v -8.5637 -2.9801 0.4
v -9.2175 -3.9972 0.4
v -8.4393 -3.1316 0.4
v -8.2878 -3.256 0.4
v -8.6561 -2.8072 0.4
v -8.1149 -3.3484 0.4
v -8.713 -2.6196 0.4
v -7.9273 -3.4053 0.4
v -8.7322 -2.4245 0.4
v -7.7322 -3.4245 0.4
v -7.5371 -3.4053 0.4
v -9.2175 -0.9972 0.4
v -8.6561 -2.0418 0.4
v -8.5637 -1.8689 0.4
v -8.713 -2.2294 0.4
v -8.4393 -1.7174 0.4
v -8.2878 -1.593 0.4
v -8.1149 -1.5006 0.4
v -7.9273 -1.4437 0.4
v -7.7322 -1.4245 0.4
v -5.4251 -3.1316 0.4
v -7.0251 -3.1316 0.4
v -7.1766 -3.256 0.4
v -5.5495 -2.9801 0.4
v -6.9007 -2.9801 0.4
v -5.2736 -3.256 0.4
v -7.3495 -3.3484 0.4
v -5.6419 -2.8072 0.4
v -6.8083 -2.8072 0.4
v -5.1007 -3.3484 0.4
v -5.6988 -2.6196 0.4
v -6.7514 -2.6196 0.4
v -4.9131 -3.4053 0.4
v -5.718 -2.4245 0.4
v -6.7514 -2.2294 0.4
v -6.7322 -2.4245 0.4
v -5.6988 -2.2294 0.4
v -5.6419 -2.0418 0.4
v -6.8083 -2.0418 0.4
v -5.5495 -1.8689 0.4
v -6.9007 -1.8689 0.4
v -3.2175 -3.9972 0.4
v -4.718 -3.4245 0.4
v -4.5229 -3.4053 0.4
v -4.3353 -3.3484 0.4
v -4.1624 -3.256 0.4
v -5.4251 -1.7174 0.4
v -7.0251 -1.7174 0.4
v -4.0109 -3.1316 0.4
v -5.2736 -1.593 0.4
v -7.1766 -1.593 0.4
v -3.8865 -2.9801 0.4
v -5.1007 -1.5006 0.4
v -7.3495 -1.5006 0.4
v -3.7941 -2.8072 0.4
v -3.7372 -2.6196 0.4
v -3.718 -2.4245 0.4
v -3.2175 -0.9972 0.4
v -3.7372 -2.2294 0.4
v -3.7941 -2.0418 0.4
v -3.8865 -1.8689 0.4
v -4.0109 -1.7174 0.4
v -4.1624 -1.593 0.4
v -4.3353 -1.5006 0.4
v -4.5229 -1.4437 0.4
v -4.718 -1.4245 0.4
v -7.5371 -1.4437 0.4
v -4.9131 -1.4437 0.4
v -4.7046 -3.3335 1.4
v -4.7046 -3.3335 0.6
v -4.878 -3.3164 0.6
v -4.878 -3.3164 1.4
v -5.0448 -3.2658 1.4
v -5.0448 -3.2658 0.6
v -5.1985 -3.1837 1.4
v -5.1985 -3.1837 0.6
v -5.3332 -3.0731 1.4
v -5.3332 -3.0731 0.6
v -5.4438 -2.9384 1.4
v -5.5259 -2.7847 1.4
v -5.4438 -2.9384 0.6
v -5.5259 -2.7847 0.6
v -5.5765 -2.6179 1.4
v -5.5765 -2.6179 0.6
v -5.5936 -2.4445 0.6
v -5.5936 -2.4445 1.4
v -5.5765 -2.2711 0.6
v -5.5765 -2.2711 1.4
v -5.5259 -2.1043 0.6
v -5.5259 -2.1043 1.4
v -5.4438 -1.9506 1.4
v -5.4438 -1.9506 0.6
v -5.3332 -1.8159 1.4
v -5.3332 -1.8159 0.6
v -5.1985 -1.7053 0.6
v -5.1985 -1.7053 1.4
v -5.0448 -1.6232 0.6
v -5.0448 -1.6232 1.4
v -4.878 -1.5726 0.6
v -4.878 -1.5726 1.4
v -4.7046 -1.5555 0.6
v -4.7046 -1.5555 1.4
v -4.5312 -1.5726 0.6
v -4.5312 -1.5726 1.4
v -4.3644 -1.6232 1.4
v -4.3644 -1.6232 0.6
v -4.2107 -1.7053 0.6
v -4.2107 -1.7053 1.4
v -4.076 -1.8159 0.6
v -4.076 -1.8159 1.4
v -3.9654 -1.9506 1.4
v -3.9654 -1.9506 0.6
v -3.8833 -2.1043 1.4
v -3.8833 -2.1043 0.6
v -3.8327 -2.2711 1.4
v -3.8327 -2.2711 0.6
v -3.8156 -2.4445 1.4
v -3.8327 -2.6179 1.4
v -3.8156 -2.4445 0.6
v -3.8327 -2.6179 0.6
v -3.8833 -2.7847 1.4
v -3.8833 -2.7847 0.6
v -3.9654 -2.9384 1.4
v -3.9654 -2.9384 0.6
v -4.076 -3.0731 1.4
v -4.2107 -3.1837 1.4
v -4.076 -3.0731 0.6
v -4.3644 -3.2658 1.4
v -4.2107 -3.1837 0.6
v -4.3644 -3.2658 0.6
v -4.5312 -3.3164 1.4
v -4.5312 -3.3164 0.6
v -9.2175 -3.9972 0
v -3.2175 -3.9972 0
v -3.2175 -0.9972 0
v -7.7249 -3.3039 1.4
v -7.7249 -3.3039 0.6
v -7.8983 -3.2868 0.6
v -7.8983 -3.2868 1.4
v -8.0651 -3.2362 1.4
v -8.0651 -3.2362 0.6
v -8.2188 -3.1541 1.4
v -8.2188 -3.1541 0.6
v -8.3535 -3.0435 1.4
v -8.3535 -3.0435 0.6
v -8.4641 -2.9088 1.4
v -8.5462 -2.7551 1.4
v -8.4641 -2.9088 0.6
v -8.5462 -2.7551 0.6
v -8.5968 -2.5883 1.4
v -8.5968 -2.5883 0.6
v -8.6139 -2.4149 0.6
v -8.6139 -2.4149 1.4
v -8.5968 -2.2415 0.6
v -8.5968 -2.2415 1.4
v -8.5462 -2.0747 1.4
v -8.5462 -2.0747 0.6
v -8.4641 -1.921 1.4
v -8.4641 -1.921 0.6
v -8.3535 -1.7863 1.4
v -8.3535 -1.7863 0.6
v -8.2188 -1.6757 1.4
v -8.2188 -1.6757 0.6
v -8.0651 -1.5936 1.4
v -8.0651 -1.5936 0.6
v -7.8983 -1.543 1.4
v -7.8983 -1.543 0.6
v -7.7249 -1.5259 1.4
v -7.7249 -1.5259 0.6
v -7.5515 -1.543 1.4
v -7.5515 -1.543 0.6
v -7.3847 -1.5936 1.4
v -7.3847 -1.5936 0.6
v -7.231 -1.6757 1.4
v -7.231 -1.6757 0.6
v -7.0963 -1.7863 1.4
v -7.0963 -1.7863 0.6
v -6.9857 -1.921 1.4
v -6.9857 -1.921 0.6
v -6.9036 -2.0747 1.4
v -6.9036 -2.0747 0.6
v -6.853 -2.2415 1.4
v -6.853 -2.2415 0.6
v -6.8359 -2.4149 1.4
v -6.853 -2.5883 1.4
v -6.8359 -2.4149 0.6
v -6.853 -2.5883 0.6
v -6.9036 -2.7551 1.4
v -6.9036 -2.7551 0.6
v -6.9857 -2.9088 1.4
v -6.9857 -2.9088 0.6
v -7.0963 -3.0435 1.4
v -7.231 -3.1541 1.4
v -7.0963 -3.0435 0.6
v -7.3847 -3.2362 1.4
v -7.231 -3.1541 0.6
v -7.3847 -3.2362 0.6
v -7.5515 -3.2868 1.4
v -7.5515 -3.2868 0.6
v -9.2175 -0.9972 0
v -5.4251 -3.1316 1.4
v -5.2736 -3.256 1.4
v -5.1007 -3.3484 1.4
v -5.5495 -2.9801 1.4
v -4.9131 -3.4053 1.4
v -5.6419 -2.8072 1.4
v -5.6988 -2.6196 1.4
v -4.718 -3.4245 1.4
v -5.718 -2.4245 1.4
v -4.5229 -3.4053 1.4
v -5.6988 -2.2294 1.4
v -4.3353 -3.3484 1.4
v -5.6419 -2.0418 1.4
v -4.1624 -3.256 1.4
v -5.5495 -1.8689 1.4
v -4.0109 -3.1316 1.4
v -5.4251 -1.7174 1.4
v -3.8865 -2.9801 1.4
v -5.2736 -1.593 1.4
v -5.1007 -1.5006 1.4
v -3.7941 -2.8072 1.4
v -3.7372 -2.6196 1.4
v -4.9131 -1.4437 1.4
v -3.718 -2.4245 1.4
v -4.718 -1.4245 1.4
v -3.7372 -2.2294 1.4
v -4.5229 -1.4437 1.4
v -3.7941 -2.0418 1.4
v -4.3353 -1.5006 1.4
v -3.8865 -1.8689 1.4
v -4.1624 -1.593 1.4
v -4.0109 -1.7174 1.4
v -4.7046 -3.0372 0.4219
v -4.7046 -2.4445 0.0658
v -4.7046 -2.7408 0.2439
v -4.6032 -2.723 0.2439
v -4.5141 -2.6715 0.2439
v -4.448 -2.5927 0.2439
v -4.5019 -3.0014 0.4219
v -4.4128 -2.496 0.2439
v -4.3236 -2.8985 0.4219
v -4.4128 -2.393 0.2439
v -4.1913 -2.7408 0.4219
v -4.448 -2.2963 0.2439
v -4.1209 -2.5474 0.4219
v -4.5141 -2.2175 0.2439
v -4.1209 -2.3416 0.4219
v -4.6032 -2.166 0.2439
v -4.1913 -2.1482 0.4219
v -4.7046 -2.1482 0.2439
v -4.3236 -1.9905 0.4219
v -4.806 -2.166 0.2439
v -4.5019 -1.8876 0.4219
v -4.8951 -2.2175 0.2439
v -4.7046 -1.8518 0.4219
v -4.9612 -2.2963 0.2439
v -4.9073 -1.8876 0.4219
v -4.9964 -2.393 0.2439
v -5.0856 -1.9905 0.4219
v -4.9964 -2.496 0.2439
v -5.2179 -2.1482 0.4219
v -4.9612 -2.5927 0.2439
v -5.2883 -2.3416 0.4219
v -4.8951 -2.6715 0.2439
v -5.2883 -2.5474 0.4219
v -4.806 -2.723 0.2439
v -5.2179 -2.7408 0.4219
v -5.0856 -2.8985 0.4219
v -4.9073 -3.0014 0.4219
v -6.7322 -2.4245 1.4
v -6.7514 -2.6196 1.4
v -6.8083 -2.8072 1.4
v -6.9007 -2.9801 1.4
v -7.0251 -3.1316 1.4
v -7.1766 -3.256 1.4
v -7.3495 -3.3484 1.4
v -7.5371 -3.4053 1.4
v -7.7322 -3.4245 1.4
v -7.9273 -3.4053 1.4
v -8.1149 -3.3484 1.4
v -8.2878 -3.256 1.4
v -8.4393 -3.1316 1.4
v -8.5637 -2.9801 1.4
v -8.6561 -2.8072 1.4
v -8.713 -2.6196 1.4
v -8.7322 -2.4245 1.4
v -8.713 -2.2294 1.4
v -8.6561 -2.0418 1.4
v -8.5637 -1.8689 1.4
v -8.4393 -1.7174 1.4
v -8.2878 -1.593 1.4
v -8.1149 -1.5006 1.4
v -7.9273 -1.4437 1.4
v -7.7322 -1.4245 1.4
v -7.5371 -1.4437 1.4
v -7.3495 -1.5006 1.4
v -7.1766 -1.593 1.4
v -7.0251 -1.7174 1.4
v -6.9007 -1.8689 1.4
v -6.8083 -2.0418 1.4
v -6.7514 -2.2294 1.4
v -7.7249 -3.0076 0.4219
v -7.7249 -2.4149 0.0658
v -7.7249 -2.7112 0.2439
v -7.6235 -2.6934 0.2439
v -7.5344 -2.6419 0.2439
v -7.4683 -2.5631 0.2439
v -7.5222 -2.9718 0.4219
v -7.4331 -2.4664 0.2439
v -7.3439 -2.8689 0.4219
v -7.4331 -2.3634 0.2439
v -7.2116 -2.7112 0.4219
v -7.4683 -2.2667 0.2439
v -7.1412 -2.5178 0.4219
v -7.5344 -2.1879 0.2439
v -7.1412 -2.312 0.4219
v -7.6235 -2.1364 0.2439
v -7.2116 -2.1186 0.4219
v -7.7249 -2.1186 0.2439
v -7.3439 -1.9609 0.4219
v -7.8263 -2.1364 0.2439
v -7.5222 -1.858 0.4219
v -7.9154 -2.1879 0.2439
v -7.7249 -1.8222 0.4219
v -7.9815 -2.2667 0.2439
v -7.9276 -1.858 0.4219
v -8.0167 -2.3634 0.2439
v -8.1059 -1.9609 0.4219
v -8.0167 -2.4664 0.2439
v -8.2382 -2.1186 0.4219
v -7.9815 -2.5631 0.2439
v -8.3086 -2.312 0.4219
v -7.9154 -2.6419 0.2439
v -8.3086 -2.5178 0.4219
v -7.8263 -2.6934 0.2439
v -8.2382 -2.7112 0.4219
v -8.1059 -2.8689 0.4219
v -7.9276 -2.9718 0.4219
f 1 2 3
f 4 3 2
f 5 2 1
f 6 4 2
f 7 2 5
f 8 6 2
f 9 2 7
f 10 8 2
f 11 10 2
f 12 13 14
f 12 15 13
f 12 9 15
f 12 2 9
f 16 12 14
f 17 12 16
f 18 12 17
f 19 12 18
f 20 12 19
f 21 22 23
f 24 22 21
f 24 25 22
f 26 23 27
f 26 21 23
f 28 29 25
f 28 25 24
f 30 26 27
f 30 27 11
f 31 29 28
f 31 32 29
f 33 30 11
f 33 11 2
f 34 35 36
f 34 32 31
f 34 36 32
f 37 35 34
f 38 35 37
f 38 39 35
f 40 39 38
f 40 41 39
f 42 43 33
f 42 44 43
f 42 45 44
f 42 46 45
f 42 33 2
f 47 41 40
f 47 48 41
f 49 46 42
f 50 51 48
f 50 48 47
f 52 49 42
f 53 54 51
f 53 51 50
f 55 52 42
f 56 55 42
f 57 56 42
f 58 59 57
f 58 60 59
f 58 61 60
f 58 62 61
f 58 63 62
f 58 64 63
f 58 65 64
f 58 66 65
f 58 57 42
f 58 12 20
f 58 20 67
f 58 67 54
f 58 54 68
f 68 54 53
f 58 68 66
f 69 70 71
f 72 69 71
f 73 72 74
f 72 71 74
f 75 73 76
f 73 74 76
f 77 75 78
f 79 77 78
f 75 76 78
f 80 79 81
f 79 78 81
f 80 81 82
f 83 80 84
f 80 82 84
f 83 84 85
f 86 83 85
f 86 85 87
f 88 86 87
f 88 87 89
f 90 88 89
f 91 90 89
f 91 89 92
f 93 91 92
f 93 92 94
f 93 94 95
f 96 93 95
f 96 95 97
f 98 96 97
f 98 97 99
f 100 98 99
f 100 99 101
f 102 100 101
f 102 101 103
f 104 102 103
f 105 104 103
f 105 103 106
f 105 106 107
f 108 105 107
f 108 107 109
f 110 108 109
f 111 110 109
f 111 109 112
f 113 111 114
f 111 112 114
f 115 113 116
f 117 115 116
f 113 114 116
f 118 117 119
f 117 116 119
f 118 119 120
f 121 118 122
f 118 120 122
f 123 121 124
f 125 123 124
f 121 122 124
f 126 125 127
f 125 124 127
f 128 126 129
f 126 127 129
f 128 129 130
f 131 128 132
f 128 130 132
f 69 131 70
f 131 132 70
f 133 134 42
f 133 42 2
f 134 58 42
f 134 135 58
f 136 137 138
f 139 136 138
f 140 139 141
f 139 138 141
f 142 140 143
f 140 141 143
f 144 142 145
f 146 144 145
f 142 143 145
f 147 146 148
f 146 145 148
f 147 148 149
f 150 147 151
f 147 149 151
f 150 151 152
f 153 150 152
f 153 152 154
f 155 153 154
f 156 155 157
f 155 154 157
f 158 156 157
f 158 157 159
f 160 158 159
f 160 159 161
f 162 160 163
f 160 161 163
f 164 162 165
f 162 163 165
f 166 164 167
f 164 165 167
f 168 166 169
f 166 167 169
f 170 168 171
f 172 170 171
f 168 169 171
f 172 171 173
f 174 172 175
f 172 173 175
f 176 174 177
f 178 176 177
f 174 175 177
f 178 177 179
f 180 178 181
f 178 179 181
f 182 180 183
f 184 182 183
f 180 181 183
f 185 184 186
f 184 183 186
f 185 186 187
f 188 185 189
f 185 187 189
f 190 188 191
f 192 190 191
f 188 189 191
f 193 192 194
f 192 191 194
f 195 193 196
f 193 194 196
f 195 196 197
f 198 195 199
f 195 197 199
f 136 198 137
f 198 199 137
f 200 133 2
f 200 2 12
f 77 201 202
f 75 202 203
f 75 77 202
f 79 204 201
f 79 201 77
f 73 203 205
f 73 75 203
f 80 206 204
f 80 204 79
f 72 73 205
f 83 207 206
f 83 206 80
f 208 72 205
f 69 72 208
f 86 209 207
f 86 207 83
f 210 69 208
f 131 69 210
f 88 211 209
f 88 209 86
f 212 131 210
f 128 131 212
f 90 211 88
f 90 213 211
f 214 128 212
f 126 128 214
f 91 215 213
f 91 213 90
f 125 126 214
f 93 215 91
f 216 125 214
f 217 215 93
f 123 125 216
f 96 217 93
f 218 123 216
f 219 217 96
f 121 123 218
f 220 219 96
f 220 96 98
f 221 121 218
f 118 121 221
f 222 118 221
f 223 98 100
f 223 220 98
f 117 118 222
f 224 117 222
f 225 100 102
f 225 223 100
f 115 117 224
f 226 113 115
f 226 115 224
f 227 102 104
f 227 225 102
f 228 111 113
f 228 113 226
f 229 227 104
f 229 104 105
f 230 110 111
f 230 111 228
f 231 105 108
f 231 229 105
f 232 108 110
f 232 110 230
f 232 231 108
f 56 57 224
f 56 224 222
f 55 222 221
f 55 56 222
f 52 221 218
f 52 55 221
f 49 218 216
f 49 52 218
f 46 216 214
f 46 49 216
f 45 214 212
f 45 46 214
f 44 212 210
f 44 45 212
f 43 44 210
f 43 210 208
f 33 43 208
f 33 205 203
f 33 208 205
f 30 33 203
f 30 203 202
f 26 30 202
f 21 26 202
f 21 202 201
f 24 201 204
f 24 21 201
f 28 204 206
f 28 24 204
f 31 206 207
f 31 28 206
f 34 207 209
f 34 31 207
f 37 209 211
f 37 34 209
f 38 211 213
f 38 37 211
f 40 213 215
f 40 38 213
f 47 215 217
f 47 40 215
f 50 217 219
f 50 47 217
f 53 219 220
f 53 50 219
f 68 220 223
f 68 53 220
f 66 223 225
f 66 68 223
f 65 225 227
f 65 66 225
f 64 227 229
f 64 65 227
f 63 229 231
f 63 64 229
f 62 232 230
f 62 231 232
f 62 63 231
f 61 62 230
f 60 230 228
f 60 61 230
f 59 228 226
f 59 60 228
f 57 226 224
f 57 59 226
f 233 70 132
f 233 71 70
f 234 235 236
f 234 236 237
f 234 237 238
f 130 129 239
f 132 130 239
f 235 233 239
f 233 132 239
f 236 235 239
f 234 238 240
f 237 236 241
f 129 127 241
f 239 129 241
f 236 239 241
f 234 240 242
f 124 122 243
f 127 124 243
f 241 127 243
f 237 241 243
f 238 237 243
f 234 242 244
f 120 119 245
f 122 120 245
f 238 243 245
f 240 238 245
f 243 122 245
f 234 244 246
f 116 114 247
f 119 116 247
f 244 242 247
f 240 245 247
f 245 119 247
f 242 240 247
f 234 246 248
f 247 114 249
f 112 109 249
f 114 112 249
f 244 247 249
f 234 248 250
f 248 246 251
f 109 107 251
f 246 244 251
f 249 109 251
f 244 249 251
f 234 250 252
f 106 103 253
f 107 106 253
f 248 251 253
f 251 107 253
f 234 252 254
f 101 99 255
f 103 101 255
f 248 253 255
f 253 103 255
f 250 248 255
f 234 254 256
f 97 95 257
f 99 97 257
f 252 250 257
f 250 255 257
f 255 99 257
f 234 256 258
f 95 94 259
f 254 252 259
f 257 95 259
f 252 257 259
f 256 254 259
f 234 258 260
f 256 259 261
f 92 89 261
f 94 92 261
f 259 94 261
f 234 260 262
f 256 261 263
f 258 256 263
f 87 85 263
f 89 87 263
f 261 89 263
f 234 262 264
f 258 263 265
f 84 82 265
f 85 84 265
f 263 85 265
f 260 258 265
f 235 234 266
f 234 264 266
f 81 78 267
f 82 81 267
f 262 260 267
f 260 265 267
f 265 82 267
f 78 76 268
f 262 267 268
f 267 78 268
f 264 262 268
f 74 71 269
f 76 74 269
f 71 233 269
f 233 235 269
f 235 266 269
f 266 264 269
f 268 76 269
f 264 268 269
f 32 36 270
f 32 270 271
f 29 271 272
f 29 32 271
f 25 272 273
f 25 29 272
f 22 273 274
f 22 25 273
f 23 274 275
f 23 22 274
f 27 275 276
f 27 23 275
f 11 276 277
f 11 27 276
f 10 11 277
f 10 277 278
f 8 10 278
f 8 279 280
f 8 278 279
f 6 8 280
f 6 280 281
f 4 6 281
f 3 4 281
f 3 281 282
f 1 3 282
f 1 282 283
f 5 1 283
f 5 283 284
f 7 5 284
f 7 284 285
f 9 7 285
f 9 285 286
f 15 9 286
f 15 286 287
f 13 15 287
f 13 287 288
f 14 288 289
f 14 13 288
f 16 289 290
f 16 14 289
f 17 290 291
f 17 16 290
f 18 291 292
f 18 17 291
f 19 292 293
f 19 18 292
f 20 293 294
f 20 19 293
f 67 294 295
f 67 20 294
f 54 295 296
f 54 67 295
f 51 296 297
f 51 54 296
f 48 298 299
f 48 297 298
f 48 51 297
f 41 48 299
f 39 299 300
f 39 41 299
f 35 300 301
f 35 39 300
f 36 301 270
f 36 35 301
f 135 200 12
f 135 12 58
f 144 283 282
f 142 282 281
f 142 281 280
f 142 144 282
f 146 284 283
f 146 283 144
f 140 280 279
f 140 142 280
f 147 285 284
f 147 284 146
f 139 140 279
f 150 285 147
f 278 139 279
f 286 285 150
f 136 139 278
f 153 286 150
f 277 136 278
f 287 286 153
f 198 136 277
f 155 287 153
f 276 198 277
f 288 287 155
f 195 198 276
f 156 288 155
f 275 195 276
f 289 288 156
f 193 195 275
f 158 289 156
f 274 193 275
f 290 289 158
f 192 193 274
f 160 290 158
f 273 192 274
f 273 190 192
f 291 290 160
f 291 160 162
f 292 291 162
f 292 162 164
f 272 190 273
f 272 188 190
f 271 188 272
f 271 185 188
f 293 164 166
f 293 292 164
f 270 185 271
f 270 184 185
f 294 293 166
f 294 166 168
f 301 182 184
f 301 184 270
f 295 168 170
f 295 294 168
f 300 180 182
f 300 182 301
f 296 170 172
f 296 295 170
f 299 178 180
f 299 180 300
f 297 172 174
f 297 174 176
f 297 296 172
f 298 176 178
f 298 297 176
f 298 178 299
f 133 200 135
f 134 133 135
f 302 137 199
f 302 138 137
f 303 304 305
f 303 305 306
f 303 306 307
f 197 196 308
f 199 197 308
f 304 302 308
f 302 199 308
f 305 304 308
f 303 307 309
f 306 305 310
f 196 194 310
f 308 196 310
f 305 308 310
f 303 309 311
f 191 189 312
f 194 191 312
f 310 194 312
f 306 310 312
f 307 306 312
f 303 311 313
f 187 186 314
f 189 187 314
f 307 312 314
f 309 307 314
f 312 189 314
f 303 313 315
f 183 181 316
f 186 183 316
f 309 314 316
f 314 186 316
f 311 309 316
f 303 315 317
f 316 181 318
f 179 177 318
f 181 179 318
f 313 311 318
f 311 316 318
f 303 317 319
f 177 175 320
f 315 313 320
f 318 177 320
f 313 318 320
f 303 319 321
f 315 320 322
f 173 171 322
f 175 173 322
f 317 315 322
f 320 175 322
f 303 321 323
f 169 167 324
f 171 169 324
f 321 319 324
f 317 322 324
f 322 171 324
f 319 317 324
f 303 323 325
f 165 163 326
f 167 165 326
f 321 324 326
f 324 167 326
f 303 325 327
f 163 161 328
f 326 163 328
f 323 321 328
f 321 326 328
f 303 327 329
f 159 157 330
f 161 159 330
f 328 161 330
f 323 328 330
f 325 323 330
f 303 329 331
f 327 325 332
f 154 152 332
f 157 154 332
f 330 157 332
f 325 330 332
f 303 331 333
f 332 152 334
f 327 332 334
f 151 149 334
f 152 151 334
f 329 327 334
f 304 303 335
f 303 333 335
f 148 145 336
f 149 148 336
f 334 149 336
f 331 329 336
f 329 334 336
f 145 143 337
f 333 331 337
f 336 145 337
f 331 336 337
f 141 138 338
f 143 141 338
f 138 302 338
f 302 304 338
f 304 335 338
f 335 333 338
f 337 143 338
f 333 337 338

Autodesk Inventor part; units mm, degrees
ref_plane "YZ Plane" through (0, 0, 0) normal (1, 0, 0) x (0, 1, 0)
ref_plane "XZ Plane" through (0, 0, 0) normal (0, 1, 0) x (-1, 0, 0)
ref_plane "XY Plane" through (0, 0, 0) normal (0, 0, 1) x (1, 0, 0)
sketch "Sketch1" plane through (0, 0, 0) normal (0, 0, 1) x (1, 0, 0)
  line L0 (-9.2175, -0.9972) -> (-3.2175, -0.9972)
  line L1 (-3.2175, -0.9972) -> (-3.2175, -3.9972)
  line L2 (-3.2175, -3.9972) -> (-9.2175, -3.9972)
  line L3 (-9.2175, -3.9972) -> (-9.2175, -0.9972)
  point P0 (0, 0)
  dimension "d0" = 6
  dimension "d1" = 3
  dimension "d2" = 6
extrude "Extrusion1" add sketch "Sketch1" along normal blind 0.4
sketch "Sketch2" plane through (0, 0, 0.4) normal (0, 0, 1) x (1, 0, 0)
  circle A0 centre (-7.7322, -2.4245) radius 1
  circle A1 centre (-4.718, -2.4245) radius 1
  point P0 (0, 0)
  dimension "d5" = 2
  dimension "d6" = 2
extrude "Extrusion2" add sketch "Sketch2" along normal blind 1
sketch "Sketch3" plane through (-7.7322, -2.4245, 1.4) normal (0, 0, 1) x (1, 0, 0)
  point P0 (7.7322, 2.4245)
  point P1 (0.0073, 0.0096)
  point P2 (3.0276, -0.0199)
hole "Hole1" at (-7.7249, -2.4149, 1.4) at (-4.7046, -2.4445, 1.4) direction (0, 0, -1) diameter 1.778 depth 0.8 tip angle 118 clearance for "Flat Head Machine Screw (82)" size "#0" standard "Ansi Unified Screw Threads"
properties part number "US sensor"
